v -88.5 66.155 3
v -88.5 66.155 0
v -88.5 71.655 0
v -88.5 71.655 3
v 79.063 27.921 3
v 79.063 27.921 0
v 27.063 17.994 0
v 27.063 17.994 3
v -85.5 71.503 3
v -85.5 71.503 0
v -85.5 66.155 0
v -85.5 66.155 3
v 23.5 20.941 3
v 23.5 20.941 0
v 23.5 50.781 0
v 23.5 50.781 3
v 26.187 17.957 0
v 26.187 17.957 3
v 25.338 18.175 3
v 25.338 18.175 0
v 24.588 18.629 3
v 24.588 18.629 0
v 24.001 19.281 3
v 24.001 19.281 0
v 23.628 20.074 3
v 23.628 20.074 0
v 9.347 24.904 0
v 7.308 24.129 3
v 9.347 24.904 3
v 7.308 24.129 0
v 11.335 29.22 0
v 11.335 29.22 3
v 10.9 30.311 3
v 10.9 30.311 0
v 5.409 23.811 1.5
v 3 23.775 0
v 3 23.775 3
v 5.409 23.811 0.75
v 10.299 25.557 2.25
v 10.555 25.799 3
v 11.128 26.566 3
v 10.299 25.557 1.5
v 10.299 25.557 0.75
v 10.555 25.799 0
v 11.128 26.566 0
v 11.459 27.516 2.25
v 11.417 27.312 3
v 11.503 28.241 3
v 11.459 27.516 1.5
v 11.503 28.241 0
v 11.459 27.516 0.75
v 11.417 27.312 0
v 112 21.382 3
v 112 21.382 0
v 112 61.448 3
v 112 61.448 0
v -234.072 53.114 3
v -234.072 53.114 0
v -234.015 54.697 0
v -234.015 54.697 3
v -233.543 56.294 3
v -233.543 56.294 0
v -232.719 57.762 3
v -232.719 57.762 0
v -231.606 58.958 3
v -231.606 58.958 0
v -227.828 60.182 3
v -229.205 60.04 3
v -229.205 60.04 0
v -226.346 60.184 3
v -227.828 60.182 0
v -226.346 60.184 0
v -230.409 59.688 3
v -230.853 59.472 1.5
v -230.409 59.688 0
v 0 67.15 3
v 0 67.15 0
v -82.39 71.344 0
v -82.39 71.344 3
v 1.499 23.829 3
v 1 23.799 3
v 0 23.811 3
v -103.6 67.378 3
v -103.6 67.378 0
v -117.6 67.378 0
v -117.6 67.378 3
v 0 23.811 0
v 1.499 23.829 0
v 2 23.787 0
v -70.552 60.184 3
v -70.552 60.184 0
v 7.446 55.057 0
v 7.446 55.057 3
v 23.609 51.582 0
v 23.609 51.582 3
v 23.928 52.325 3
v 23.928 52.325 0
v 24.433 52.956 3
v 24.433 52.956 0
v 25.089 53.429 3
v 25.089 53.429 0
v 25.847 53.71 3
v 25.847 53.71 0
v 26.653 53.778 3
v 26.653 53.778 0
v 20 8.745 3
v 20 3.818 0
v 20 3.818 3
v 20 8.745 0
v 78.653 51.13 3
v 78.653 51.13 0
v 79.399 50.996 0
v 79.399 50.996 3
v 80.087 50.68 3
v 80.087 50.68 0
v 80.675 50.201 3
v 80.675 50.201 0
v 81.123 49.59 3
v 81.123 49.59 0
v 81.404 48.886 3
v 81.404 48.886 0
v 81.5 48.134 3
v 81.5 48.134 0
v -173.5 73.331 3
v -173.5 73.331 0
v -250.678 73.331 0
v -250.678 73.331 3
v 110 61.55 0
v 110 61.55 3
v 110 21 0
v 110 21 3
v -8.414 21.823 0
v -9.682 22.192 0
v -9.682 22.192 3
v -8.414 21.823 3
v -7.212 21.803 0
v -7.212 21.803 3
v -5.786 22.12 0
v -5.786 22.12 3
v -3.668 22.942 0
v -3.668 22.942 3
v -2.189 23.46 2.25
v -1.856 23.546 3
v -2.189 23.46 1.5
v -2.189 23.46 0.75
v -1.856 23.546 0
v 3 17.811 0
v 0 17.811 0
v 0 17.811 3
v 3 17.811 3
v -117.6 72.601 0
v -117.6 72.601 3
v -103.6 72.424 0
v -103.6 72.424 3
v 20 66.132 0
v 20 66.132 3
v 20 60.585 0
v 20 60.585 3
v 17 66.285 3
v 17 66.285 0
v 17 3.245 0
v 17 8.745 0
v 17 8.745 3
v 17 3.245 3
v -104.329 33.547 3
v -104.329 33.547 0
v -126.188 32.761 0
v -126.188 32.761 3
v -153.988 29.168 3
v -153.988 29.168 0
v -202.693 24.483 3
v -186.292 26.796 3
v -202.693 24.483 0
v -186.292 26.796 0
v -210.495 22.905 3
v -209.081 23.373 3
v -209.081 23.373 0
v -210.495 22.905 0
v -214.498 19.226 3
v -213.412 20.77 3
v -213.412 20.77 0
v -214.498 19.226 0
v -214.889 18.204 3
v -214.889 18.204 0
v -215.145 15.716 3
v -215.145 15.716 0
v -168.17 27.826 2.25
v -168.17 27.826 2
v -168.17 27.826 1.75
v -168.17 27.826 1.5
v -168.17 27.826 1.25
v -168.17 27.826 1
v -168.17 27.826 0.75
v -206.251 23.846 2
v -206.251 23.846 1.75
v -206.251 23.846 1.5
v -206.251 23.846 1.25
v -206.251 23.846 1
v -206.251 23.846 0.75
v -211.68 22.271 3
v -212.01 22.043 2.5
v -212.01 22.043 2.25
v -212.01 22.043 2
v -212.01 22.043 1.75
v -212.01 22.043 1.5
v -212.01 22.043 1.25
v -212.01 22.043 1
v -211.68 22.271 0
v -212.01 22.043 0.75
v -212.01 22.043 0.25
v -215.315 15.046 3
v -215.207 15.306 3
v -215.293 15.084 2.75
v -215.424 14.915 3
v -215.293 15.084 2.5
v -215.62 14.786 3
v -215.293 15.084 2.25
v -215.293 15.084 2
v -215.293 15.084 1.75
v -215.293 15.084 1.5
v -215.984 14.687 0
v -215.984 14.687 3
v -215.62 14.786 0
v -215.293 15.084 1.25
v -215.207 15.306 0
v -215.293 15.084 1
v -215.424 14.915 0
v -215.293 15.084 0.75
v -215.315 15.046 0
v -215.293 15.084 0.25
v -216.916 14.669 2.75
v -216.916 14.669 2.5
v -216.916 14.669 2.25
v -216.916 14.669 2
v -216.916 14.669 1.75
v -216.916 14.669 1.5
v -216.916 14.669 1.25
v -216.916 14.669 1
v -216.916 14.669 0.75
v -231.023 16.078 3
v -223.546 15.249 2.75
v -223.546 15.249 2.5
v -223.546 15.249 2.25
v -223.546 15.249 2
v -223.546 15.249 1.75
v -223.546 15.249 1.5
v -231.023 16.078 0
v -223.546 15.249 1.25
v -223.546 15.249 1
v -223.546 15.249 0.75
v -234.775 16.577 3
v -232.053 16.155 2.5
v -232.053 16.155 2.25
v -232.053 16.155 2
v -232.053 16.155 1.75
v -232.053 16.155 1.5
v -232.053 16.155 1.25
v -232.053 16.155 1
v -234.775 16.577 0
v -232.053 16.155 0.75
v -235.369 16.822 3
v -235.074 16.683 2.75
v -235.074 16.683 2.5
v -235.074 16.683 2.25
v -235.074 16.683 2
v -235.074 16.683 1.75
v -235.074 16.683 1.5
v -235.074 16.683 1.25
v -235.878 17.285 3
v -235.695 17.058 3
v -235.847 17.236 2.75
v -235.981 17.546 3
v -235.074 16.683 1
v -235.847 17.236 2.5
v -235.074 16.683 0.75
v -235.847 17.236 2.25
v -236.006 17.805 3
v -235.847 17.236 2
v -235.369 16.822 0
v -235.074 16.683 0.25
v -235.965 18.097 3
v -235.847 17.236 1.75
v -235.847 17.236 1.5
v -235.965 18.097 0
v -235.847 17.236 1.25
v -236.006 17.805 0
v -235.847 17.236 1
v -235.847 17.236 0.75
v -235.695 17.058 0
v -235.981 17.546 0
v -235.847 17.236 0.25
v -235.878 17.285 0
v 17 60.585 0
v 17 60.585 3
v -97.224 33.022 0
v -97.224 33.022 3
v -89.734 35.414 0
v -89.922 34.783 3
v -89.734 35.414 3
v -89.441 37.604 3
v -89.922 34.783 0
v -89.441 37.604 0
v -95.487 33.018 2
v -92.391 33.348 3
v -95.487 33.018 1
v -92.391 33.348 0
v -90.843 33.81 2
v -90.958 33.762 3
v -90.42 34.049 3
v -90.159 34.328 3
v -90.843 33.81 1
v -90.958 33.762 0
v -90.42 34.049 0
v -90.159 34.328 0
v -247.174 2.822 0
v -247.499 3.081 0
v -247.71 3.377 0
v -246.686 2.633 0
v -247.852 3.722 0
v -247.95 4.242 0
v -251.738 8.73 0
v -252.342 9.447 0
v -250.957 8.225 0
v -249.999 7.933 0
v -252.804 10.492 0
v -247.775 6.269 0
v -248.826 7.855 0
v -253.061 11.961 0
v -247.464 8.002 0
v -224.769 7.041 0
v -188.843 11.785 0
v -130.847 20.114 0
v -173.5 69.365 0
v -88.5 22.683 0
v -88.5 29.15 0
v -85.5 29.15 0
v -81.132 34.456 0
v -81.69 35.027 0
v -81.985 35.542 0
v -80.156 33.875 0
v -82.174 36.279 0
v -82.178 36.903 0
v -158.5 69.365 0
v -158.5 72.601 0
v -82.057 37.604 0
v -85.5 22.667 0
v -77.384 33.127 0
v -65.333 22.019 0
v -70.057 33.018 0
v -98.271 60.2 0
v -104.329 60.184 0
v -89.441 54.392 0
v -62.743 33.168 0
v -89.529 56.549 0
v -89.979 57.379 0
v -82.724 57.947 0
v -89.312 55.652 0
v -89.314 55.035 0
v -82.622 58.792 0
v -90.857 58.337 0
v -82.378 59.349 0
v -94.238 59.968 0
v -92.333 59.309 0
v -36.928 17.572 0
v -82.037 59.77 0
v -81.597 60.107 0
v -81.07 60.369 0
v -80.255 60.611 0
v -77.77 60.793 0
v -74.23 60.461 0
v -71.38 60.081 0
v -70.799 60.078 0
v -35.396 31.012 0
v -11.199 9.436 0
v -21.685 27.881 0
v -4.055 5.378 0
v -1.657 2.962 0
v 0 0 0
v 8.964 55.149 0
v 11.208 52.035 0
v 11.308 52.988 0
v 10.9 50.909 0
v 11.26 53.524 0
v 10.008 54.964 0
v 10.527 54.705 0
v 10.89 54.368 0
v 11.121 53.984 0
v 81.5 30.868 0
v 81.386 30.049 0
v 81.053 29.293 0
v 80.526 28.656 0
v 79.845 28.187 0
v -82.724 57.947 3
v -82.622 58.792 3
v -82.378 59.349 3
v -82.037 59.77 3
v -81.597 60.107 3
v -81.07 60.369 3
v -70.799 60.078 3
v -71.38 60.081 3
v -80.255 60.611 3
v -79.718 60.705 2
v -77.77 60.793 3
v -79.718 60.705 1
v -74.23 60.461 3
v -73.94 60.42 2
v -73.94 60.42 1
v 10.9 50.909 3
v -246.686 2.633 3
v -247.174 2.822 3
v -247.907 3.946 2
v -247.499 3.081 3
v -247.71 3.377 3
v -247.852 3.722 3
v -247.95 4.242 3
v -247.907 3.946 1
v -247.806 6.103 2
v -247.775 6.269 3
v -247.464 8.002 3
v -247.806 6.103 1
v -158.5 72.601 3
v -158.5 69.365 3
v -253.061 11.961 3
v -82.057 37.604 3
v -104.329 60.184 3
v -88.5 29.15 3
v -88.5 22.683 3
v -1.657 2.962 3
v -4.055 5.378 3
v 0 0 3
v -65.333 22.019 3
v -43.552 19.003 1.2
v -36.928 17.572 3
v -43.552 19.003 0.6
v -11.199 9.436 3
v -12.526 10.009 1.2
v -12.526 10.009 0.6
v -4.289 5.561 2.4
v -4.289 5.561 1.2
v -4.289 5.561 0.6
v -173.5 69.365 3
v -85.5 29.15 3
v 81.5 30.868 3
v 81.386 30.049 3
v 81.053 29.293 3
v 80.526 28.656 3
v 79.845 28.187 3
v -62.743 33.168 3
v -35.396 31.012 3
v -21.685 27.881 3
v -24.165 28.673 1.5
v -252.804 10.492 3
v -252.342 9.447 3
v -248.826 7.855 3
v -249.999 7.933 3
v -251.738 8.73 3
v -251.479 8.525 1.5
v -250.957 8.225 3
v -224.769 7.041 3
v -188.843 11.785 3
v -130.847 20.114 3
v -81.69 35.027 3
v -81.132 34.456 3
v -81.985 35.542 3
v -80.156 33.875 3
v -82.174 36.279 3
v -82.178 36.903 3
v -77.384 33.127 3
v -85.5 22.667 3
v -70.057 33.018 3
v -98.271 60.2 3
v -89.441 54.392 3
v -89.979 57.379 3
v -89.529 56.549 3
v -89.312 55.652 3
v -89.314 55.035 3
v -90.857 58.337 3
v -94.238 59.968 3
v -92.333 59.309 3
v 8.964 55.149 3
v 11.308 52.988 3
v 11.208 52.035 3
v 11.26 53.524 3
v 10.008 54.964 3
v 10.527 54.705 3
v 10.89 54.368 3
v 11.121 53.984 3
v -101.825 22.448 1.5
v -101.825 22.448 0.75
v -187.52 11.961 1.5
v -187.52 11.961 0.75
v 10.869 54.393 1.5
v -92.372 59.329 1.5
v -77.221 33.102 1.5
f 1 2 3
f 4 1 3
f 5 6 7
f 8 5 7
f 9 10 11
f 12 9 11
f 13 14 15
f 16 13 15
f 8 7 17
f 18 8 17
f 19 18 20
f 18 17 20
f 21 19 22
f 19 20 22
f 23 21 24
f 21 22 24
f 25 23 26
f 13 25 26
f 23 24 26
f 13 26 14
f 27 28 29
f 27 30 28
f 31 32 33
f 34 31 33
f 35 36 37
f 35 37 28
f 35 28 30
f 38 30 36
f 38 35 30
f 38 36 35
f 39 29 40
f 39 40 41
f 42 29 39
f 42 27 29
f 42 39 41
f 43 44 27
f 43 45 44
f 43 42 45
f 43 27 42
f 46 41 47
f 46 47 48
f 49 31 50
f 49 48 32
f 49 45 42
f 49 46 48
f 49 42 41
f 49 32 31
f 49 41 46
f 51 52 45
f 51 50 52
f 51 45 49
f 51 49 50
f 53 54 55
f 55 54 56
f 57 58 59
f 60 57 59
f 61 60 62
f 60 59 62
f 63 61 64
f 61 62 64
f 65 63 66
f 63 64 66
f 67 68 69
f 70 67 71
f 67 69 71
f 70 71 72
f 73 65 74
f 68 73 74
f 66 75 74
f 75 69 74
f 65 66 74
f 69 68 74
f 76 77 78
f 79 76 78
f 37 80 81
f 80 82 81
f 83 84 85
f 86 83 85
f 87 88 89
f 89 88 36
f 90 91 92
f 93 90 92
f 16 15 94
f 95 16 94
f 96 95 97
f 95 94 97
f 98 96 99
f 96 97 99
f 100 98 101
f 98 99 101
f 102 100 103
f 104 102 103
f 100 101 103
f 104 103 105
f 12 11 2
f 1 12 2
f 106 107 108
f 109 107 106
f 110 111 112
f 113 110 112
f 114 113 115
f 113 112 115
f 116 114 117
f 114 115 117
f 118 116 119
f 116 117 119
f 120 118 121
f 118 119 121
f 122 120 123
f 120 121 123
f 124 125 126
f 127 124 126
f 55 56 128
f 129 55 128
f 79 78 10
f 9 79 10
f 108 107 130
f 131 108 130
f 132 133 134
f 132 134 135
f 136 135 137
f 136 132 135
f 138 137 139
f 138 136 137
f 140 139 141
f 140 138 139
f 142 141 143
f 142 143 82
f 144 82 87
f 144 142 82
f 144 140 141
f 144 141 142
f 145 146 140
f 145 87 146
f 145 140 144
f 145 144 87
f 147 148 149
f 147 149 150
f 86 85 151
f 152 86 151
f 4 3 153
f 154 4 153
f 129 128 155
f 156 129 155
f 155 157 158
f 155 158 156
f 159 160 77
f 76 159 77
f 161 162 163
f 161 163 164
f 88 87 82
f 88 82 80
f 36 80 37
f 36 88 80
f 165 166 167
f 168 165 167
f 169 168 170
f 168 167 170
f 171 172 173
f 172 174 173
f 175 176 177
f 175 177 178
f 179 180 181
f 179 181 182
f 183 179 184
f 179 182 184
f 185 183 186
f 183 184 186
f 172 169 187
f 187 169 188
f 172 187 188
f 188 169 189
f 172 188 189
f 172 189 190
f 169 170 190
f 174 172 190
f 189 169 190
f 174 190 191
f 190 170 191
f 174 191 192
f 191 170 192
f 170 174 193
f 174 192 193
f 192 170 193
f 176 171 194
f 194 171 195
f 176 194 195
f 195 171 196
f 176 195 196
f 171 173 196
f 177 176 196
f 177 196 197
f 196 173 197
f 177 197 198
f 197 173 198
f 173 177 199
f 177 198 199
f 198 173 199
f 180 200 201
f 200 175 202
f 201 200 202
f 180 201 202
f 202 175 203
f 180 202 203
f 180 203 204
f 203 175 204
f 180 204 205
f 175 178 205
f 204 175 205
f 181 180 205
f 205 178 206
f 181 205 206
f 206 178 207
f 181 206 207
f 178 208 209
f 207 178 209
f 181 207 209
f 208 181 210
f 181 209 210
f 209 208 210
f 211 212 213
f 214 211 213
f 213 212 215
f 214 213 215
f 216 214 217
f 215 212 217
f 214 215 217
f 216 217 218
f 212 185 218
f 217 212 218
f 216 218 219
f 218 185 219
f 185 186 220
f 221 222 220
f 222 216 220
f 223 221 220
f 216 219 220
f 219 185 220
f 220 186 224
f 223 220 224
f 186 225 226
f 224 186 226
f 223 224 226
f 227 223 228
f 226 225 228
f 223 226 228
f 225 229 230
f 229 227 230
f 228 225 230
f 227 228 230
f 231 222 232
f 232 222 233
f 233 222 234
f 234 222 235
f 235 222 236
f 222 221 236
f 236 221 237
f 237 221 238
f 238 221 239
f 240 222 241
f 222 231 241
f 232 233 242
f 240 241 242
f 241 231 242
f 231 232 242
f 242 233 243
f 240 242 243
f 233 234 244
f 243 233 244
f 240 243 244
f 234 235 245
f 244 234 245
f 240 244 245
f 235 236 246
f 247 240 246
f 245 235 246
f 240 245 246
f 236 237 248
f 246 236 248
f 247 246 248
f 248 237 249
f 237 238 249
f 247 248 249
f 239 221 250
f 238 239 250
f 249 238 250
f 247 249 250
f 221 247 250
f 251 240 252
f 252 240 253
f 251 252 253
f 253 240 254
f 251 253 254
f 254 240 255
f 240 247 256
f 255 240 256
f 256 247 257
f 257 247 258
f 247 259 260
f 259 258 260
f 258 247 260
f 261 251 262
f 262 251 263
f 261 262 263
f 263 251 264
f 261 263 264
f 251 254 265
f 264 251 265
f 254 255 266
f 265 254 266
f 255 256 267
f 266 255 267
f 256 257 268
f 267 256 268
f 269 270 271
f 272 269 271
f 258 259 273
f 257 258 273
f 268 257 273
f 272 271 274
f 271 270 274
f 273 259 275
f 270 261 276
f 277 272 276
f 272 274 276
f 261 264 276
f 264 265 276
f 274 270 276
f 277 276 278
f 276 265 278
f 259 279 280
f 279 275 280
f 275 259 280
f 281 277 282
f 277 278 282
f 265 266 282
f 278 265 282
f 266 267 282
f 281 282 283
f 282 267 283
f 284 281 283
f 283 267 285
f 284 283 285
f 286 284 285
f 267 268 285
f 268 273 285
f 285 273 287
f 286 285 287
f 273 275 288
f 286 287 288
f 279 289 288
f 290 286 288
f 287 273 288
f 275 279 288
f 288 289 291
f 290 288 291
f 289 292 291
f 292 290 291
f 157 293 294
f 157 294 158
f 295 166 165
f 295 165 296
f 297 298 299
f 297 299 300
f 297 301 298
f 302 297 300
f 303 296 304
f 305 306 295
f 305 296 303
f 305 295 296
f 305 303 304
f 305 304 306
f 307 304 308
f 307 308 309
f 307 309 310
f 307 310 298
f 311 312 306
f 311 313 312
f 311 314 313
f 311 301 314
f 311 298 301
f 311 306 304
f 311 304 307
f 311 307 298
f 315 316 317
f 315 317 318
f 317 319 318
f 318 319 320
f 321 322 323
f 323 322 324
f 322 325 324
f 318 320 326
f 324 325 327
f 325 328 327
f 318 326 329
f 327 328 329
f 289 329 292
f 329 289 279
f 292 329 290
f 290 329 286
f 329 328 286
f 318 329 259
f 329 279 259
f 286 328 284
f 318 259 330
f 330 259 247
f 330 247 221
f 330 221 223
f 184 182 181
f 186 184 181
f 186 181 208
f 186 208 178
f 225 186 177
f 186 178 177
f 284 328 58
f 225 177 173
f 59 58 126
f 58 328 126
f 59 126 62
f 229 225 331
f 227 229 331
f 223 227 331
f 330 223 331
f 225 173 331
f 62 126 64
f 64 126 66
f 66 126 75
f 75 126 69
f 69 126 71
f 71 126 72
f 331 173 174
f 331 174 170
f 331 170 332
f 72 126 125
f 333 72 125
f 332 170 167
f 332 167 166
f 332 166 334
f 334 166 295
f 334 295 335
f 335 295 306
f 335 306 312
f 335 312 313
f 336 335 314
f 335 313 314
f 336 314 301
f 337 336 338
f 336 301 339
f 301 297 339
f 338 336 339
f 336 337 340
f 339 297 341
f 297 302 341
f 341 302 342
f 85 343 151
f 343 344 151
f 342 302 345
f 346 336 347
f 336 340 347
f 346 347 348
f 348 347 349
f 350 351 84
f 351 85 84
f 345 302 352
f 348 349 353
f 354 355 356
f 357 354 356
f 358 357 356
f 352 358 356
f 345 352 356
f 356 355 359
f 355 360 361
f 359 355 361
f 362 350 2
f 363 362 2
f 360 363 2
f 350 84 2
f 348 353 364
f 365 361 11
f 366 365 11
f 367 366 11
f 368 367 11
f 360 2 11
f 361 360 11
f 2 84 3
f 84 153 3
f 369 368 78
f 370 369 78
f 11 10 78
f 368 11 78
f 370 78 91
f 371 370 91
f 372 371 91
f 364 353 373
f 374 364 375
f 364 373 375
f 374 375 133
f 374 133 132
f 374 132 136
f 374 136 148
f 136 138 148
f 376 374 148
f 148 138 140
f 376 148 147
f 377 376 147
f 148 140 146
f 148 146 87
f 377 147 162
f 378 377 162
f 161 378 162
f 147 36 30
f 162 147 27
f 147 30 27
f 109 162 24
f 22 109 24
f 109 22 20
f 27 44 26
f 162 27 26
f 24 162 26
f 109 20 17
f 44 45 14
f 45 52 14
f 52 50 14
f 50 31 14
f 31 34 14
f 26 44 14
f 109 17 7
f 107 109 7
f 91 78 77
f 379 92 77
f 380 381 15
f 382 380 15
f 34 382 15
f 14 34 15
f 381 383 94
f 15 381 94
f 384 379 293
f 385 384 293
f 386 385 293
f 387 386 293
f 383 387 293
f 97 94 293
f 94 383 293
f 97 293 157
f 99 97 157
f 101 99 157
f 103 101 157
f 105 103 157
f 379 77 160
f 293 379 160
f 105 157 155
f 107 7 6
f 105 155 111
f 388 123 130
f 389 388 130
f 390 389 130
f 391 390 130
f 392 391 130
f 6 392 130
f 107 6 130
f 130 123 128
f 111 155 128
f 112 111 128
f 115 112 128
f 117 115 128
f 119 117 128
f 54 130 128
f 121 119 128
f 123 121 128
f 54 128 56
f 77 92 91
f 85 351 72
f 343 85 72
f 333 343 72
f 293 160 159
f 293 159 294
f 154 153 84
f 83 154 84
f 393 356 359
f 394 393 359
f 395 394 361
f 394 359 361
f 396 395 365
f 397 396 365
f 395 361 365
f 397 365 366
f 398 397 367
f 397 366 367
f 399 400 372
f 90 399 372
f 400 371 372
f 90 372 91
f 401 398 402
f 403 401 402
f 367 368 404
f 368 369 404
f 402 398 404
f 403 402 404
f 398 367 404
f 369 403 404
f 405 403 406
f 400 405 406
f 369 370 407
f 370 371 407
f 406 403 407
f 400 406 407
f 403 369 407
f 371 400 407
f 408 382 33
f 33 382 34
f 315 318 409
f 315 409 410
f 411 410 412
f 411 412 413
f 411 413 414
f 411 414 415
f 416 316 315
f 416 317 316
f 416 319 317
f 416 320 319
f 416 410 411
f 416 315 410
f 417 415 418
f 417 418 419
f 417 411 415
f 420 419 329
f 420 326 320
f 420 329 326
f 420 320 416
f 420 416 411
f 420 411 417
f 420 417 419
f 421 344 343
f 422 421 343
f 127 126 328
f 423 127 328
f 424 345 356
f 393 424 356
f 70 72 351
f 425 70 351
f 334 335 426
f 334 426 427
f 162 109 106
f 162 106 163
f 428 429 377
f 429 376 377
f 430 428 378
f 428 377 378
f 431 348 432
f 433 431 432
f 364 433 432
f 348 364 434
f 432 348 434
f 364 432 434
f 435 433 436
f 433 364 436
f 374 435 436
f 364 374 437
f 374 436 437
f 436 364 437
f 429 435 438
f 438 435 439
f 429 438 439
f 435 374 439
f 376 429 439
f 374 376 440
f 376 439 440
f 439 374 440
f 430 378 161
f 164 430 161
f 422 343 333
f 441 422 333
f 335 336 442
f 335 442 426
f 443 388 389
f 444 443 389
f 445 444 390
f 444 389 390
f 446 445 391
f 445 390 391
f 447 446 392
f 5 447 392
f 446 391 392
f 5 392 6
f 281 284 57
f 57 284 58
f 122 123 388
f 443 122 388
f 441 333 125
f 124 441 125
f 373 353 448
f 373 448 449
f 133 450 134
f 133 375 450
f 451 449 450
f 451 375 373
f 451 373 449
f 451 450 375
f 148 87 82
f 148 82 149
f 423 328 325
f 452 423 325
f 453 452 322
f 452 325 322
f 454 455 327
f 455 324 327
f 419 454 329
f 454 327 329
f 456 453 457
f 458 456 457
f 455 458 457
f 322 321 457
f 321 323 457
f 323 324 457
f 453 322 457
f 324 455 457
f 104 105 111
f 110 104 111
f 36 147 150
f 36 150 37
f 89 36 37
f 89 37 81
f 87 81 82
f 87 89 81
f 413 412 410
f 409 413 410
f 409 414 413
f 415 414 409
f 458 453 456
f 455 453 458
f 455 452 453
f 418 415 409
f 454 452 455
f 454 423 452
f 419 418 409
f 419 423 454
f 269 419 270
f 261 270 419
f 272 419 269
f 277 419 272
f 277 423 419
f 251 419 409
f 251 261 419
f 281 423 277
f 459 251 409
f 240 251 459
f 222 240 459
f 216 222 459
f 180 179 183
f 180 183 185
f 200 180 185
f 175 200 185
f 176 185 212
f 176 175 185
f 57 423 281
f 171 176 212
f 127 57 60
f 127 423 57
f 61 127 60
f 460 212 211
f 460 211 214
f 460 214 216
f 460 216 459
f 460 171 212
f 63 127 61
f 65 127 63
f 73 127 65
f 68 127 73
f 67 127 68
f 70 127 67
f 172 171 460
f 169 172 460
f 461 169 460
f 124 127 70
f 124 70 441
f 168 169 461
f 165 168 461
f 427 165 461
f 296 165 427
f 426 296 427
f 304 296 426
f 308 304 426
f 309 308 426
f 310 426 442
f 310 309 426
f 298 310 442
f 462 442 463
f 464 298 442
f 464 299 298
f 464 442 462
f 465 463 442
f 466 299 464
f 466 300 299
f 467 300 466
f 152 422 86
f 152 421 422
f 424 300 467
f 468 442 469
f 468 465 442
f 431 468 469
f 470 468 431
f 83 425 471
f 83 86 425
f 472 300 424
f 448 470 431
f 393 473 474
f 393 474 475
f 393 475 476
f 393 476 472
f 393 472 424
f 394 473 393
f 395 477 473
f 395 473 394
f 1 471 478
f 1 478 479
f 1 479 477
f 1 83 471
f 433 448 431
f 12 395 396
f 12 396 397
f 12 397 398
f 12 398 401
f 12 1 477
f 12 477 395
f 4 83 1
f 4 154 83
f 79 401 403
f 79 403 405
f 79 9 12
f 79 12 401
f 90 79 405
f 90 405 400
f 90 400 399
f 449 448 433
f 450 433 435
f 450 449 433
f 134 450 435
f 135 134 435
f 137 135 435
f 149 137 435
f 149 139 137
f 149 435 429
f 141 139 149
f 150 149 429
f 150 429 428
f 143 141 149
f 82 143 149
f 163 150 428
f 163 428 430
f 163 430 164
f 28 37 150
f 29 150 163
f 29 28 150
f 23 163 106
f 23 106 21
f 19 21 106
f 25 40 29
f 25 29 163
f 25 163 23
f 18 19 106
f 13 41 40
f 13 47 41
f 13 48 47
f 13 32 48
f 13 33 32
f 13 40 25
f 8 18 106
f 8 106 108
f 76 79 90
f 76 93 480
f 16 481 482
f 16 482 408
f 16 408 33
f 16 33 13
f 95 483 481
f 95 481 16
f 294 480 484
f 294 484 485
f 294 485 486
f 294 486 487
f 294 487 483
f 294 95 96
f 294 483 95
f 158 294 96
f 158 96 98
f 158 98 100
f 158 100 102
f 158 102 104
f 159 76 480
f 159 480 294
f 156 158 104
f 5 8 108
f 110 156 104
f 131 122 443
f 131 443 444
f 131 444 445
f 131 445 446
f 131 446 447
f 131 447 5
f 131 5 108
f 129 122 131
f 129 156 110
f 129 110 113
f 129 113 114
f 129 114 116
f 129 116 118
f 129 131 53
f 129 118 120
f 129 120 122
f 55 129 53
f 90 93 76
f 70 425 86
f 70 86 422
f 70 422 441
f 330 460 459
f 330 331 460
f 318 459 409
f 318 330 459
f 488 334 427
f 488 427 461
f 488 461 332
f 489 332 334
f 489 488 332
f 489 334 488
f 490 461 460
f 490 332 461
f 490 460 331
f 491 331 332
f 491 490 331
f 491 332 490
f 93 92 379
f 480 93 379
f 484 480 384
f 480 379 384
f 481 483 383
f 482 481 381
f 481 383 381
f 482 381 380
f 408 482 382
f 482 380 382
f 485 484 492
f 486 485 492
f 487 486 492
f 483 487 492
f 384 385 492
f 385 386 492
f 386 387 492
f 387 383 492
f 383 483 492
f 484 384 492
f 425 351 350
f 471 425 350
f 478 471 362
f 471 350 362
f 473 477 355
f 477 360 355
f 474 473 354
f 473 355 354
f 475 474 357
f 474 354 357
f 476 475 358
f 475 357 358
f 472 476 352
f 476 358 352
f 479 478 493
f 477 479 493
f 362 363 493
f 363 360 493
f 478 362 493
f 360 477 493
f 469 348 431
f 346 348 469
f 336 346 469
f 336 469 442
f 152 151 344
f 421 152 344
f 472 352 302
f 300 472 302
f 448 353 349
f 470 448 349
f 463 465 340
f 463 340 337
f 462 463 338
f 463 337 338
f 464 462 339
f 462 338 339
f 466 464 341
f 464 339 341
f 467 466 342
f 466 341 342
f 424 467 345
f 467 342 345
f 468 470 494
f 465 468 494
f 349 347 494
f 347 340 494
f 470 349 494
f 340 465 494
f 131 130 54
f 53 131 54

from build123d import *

# Parameters (mm, degrees)
BOSS_EXTRUDE1_DEPTH = 3
CUT_EXTRUDE1_DEPTH  = 10


with BuildPart() as part:
    # Sketch2 → Boss-Extrude1 (new body)
    with BuildSketch(Plane.XY):
        with BuildLine():
            Line((0, 0), (110, 21))
            Line((110, 21), (112, 21.381818182))
            Line((112, 21.381818182), (112, 61.448181818))
            Line((112, 61.448181818), (110, 61.55))
            Line((110, 61.55), (0, 67.15))
            Line((0, 67.15), (-82.390203114, 71.34441034))
            Line((-82.390203114, 71.34441034), (-103.6, 72.424181818))
            Line((-103.6, 72.424181818), (-103.6, 67.37820483))
            Line((-103.6, 67.37820483), (-117.6, 67.37820483))
            Line((-117.6, 67.37820483), (-117.6, 72.601052263))
            Line((-117.6, 72.601052263), (-158.5, 72.601052263))
            Line((-158.5, 72.601052263), (-158.5, 69.364688627))
            Line((-158.5, 69.364688627), (-173.5, 69.364688627))
            Line((-173.5, 69.364688627), (-173.5, 73.331090951))
            Line((-173.5, 73.331090951), (-250.677847371, 73.331090951))
            Line((-250.677847371, 73.331090951), (-253.061371258, 11.961204736))
            add(Edge.make_bspline(
                [(-253.061371258, 11.961204736), (-252.695301584, 7.068046763), (-247.464044481, 8.001792052)],
                knots=[0, 0, 0, 1, 1, 1], degree=2))
            add(Edge.make_bspline(
                [(-246.686111499, 2.633333185), (-248.928327974, 3.154366263), (-247.565880058, 6.601623711), (-247.464044481, 8.001792052)],
                knots=[0, 0, 0, 0, 1, 1, 1, 1], degree=3))
            add(Edge.make_bspline(
                [(-65.333160353, 22.019355812), (-77.480540088, 22.650929106), (-98.896728943, 23.107888404), (-139.769352892, 19.70316867), (-187.764905902, 10.999138586), (-227.306911957, 7.574935575), (-246.686111499, 2.633333185)],
                knots=[0, 0, 0, 0, 0.199691583, 0.351002585, 0.672193729, 1, 1, 1, 1], degree=3))
            add(Edge.make_bspline(
                [(-65.333160353, 22.019355812), (-42.246849715, 20.282066996), (-21.407879052, 14.561565245), (-8.536750112, 8.841063495), (-2.816248361, 7.002330789), (0, 0)],
                knots=[0, 0, 0, 0, 0, 0, 1, 1, 1, 1, 1, 1], degree=5))
        make_face()
        with BuildLine():
            Line((-89.441261827, 54.392298884), (-89.441261827, 37.604150406))
            add(Edge.make_bspline(
                [(-104.329396805, 33.547035275), (-100.682618996, 33.394104005), (-97.382402753, 32.676775417), (-91.130908001, 33.381006052), (-89.678422418, 34.472960488), (-89.441261827, 37.604150406)],
                knots=[0, 0, 0, 0, 0.555990573, 0.846219419, 1, 1, 1, 1], degree=3))
            add(Edge.make_bspline(
                [(-104.329396805, 33.547035275), (-116.493109997, 34.396092023), (-139.929418179, 30.821418593), (-169.962277451, 27.14780605), (-193.860677461, 26.943078993), (-204.040193674, 24.002251793), (-211.121686975, 23.256409578), (-214.802567157, 19.37603681), (-215.291778777, 15.945620099), (-214.944708642, 14.616354017), (-218.189096905, 14.698834441), (-221.731161567, 14.919216265), (-230.68666506, 16.393699305), (-236.468542767, 15.997067549), (-235.965307072, 18.096765723)],
                knots=[0, 0, 0, 0, 0.241115862, 0.431915035, 0.666520812, 0.747658649, 0.783153313, 0.799752274, 0.821747719, 0.858268795, 0.866885423, 0.907913999, 0.932705762, 1, 1, 1, 1], degree=3))
            Line((-235.965307072, 18.096765723), (-234.071503912, 53.114221153))
            add(Edge.make_bspline(
                [(-234.071503912, 53.114221153), (-234.335930921, 55.447445444), (-232.051578262, 60.104673077), (-228.045938699, 60.224858547), (-226.345875639, 60.184031836)],
                knots=[0, 0, 0, 0, 0.618253861, 1, 1, 1, 1], degree=3))
            Line((-226.345875639, 60.184031836), (-104.329396805, 60.184031836))
            add(Edge.make_bspline(
                [(-104.329396805, 60.184031836), (-100.530128109, 59.551333425), (-93.80069914, 61.948546143), (-88.78657296, 56.595347424), (-89.441261827, 54.392298884)],
                knots=[0, 0, 0, 0, 0.661963739, 1, 1, 1, 1], degree=3))
        make_face(mode=Mode.SUBTRACT)
        with BuildLine():
            Line((-70.551573081, 60.184031836), (7.446201395, 55.056640509))
            add(Edge.make_bspline(
                [(7.446201395, 55.056640509), (12.564500916, 55.804176812), (10.9, 50.909005104)],
                knots=[0, 0, 0, 1, 1, 1], degree=2))
            Line((10.9, 50.909005104), (10.9, 30.311377022))
            add(Edge.make_bspline(
                [(-9.682185597, 22.192002613), (-6.891728171, 20.96675296), (-4.065354224, 23.28006022), (1.076965434, 24.030922879), (6.734860441, 23.127593713), (13.079581397, 25.987079624), (10.9, 30.311377022)],
                knots=[0, 0, 0, 0, 0.304362413, 0.391412184, 0.603770874, 1, 1, 1, 1], degree=3))
            add(Edge.make_bspline(
                [(-62.742811391, 33.167576806), (-50.008044132, 31.964235318), (-31.096212571, 32.501506515), (-14.175068968, 24.991386158), (-9.682185597, 22.192002613)],
                knots=[0, 0, 0, 0, 0.709754517, 1, 1, 1, 1], degree=3))
            add(Edge.make_bspline(
                [(-62.742811391, 33.167576806), (-67.936797189, 33.638800445), (-74.145228302, 31.661930968), (-82.862654784, 34.444793752), (-82.056720578, 37.604150406)],
                knots=[0, 0, 0, 0, 0.659769786, 1, 1, 1, 1], degree=3))
            Line((-82.056720578, 37.604150406), (-82.72368565, 57.946585111))
            add(Edge.make_bspline(
                [(-82.72368565, 57.946585111), (-82.824847935, 63.257683512), (-71.023490088, 59.363693918), (-70.551573081, 60.184031836)],
                knots=[0, 0, 0, 0, 1, 1, 1, 1], degree=3))
        make_face(mode=Mode.SUBTRACT)
        with BuildLine():
            Line((81.5, 48.134210925), (81.5, 30.868100536))
            ThreePointArc((81.5, 30.868100536), (80.811677078, 28.955994606), (79.062567275, 27.92131957))
            Line((79.062567275, 27.92131957), (27.062567275, 17.994046843))
            ThreePointArc((27.062567275, 17.994046843), (24.58789407, 18.629150731), (23.5, 20.940827809))
            Line((23.5, 20.940827809), (23.5, 50.781483653))
            ThreePointArc((23.5, 50.781483653), (24.433310525, 52.956062833), (26.652529742, 53.77760359))
            Line((26.652529742, 53.77760359), (78.652529742, 51.130330863))
            ThreePointArc((78.652529742, 51.130330863), (80.674579181, 50.2009004), (81.5, 48.134210925))
        make_face(mode=Mode.SUBTRACT)
    extrude(amount=BOSS_EXTRUDE1_DEPTH)

    # Sketch3 → Cut-Extrude1 (cut)
    with BuildSketch(Plane(origin=(0, 0, 0), x_dir=(-1, 0, 0), z_dir=(0, 0, -1))):
        Polygon((-17, 66.284545455), (-17, 60.584545455), (-20, 60.584545455), (-20, 66.131818182), align=None)
        Polygon((-17, 8.745454545), (-17, 3.245454545), (-20, 3.774800201), (-20, 8.745454545), align=None)
        Polygon((85.5, 71.502727273), (85.5, 66.155454545), (88.5, 66.155454545), (88.5, 71.655454545), align=None)
        Polygon((88.5, 29.150063041), (88.5, 22.550063041), (85.5, 22.666651642), (85.5, 29.150063041), align=None)
        Polygon((0, 23.810746374), (0, 17.810746374), (-3, 17.810746374), (-3, 23.775249064), align=None)
    extrude(amount=-CUT_EXTRUDE1_DEPTH, mode=Mode.SUBTRACT)


solid = part.part
